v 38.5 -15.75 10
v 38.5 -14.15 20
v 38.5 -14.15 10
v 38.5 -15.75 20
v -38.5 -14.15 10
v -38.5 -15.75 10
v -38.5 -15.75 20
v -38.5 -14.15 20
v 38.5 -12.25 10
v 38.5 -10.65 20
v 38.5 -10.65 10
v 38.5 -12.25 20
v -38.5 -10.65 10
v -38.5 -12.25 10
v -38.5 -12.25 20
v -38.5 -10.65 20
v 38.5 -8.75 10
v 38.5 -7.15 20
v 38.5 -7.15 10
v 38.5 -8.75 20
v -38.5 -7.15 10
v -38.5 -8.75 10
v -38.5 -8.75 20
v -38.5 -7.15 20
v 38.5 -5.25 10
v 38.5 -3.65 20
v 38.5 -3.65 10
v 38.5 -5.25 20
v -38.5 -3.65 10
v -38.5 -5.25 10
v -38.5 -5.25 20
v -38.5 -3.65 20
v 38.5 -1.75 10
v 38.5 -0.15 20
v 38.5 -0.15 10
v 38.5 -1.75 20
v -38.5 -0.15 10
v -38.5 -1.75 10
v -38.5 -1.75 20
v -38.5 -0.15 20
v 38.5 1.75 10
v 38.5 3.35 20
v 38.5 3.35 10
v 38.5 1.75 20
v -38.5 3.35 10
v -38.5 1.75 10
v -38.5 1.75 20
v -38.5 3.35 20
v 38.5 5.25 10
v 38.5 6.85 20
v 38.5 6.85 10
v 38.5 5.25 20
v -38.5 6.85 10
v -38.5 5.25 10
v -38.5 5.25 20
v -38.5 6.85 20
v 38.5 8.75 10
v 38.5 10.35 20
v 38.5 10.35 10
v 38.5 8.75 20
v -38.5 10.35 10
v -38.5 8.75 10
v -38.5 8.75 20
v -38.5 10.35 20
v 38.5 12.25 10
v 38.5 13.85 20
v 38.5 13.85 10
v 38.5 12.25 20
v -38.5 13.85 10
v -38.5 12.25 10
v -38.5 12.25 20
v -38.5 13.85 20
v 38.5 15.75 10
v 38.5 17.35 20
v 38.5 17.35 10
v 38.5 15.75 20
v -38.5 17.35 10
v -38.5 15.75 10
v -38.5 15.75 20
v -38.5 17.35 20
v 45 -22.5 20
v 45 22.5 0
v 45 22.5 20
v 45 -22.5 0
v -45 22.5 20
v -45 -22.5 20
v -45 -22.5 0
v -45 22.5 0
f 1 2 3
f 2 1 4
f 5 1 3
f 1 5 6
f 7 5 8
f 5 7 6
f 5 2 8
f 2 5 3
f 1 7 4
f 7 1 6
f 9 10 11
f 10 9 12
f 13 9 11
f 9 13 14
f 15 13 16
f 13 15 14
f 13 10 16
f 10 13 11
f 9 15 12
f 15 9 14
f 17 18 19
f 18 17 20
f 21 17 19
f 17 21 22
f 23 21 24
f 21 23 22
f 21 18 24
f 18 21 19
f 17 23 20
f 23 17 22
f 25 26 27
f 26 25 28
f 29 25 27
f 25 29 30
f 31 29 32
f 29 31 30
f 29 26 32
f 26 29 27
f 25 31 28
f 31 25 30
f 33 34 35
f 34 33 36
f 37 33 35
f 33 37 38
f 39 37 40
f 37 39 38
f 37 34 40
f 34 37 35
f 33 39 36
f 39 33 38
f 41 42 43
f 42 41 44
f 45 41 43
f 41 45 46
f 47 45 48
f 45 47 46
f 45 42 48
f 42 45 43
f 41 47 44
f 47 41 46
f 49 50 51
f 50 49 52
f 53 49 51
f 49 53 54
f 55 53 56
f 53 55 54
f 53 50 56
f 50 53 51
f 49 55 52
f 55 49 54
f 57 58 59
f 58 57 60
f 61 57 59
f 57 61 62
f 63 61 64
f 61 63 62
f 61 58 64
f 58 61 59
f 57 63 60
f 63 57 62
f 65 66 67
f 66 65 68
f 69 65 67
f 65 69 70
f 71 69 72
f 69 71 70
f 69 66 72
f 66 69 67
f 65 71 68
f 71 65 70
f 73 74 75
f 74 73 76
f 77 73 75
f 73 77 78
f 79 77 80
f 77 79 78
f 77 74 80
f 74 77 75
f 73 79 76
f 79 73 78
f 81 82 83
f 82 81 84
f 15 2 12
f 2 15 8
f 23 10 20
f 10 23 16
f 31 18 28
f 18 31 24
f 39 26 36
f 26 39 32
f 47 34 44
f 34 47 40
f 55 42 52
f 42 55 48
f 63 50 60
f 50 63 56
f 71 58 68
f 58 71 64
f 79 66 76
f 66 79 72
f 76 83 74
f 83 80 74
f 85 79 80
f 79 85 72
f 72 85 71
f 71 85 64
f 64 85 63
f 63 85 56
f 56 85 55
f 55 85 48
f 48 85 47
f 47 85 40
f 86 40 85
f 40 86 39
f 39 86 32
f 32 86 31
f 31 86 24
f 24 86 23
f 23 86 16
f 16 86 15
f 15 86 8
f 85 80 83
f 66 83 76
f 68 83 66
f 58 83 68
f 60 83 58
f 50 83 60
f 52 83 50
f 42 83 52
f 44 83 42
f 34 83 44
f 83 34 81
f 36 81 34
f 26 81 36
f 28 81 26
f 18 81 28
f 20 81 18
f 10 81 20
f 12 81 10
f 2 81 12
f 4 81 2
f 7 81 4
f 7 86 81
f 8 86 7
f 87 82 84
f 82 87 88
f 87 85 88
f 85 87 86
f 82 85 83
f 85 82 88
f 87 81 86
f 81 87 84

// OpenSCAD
// Microscope slide drying rack
// Print orientation: base block on XY plane, slots open upward (+Z)

// ---------------- Parameters ----------------
block_len    = 90;    // base block length along X (mm)
block_wid    = 45;    // base block width along Y (mm)
block_ht     = 20;    // base block height along Z (mm)

slot_count   = 10;    // number of microscope slide slots
slot_len     = 77;    // slot length along X (mm)
slot_w       = 1.6;   // slot width along Y (mm)
slot_depth   = 10;    // slot depth into block from top face (mm)
slot_pitch   = 3.5;   // centre-to-centre slot spacing along Y (mm)

eps          = 0.5;   // overshoot so cutters pass cleanly through the top face (mm)

$fn = 64;

// ---------------- Model ----------------
difference() {
    // Solid base block, centred in X and Y, sitting on z = 0
    translate([-block_len / 2, -block_wid / 2, 0])
        cube([block_len, block_wid, block_ht]);

    // Parallel slots running along X, centred as a group in X and Y
    for (i = [0 : slot_count - 1]) {
        y = (i - (slot_count - 1) / 2) * slot_pitch;
        translate([-slot_len / 2, y, block_ht - slot_depth])
            cube([slot_len, slot_w, slot_depth + eps]);
    }
}
